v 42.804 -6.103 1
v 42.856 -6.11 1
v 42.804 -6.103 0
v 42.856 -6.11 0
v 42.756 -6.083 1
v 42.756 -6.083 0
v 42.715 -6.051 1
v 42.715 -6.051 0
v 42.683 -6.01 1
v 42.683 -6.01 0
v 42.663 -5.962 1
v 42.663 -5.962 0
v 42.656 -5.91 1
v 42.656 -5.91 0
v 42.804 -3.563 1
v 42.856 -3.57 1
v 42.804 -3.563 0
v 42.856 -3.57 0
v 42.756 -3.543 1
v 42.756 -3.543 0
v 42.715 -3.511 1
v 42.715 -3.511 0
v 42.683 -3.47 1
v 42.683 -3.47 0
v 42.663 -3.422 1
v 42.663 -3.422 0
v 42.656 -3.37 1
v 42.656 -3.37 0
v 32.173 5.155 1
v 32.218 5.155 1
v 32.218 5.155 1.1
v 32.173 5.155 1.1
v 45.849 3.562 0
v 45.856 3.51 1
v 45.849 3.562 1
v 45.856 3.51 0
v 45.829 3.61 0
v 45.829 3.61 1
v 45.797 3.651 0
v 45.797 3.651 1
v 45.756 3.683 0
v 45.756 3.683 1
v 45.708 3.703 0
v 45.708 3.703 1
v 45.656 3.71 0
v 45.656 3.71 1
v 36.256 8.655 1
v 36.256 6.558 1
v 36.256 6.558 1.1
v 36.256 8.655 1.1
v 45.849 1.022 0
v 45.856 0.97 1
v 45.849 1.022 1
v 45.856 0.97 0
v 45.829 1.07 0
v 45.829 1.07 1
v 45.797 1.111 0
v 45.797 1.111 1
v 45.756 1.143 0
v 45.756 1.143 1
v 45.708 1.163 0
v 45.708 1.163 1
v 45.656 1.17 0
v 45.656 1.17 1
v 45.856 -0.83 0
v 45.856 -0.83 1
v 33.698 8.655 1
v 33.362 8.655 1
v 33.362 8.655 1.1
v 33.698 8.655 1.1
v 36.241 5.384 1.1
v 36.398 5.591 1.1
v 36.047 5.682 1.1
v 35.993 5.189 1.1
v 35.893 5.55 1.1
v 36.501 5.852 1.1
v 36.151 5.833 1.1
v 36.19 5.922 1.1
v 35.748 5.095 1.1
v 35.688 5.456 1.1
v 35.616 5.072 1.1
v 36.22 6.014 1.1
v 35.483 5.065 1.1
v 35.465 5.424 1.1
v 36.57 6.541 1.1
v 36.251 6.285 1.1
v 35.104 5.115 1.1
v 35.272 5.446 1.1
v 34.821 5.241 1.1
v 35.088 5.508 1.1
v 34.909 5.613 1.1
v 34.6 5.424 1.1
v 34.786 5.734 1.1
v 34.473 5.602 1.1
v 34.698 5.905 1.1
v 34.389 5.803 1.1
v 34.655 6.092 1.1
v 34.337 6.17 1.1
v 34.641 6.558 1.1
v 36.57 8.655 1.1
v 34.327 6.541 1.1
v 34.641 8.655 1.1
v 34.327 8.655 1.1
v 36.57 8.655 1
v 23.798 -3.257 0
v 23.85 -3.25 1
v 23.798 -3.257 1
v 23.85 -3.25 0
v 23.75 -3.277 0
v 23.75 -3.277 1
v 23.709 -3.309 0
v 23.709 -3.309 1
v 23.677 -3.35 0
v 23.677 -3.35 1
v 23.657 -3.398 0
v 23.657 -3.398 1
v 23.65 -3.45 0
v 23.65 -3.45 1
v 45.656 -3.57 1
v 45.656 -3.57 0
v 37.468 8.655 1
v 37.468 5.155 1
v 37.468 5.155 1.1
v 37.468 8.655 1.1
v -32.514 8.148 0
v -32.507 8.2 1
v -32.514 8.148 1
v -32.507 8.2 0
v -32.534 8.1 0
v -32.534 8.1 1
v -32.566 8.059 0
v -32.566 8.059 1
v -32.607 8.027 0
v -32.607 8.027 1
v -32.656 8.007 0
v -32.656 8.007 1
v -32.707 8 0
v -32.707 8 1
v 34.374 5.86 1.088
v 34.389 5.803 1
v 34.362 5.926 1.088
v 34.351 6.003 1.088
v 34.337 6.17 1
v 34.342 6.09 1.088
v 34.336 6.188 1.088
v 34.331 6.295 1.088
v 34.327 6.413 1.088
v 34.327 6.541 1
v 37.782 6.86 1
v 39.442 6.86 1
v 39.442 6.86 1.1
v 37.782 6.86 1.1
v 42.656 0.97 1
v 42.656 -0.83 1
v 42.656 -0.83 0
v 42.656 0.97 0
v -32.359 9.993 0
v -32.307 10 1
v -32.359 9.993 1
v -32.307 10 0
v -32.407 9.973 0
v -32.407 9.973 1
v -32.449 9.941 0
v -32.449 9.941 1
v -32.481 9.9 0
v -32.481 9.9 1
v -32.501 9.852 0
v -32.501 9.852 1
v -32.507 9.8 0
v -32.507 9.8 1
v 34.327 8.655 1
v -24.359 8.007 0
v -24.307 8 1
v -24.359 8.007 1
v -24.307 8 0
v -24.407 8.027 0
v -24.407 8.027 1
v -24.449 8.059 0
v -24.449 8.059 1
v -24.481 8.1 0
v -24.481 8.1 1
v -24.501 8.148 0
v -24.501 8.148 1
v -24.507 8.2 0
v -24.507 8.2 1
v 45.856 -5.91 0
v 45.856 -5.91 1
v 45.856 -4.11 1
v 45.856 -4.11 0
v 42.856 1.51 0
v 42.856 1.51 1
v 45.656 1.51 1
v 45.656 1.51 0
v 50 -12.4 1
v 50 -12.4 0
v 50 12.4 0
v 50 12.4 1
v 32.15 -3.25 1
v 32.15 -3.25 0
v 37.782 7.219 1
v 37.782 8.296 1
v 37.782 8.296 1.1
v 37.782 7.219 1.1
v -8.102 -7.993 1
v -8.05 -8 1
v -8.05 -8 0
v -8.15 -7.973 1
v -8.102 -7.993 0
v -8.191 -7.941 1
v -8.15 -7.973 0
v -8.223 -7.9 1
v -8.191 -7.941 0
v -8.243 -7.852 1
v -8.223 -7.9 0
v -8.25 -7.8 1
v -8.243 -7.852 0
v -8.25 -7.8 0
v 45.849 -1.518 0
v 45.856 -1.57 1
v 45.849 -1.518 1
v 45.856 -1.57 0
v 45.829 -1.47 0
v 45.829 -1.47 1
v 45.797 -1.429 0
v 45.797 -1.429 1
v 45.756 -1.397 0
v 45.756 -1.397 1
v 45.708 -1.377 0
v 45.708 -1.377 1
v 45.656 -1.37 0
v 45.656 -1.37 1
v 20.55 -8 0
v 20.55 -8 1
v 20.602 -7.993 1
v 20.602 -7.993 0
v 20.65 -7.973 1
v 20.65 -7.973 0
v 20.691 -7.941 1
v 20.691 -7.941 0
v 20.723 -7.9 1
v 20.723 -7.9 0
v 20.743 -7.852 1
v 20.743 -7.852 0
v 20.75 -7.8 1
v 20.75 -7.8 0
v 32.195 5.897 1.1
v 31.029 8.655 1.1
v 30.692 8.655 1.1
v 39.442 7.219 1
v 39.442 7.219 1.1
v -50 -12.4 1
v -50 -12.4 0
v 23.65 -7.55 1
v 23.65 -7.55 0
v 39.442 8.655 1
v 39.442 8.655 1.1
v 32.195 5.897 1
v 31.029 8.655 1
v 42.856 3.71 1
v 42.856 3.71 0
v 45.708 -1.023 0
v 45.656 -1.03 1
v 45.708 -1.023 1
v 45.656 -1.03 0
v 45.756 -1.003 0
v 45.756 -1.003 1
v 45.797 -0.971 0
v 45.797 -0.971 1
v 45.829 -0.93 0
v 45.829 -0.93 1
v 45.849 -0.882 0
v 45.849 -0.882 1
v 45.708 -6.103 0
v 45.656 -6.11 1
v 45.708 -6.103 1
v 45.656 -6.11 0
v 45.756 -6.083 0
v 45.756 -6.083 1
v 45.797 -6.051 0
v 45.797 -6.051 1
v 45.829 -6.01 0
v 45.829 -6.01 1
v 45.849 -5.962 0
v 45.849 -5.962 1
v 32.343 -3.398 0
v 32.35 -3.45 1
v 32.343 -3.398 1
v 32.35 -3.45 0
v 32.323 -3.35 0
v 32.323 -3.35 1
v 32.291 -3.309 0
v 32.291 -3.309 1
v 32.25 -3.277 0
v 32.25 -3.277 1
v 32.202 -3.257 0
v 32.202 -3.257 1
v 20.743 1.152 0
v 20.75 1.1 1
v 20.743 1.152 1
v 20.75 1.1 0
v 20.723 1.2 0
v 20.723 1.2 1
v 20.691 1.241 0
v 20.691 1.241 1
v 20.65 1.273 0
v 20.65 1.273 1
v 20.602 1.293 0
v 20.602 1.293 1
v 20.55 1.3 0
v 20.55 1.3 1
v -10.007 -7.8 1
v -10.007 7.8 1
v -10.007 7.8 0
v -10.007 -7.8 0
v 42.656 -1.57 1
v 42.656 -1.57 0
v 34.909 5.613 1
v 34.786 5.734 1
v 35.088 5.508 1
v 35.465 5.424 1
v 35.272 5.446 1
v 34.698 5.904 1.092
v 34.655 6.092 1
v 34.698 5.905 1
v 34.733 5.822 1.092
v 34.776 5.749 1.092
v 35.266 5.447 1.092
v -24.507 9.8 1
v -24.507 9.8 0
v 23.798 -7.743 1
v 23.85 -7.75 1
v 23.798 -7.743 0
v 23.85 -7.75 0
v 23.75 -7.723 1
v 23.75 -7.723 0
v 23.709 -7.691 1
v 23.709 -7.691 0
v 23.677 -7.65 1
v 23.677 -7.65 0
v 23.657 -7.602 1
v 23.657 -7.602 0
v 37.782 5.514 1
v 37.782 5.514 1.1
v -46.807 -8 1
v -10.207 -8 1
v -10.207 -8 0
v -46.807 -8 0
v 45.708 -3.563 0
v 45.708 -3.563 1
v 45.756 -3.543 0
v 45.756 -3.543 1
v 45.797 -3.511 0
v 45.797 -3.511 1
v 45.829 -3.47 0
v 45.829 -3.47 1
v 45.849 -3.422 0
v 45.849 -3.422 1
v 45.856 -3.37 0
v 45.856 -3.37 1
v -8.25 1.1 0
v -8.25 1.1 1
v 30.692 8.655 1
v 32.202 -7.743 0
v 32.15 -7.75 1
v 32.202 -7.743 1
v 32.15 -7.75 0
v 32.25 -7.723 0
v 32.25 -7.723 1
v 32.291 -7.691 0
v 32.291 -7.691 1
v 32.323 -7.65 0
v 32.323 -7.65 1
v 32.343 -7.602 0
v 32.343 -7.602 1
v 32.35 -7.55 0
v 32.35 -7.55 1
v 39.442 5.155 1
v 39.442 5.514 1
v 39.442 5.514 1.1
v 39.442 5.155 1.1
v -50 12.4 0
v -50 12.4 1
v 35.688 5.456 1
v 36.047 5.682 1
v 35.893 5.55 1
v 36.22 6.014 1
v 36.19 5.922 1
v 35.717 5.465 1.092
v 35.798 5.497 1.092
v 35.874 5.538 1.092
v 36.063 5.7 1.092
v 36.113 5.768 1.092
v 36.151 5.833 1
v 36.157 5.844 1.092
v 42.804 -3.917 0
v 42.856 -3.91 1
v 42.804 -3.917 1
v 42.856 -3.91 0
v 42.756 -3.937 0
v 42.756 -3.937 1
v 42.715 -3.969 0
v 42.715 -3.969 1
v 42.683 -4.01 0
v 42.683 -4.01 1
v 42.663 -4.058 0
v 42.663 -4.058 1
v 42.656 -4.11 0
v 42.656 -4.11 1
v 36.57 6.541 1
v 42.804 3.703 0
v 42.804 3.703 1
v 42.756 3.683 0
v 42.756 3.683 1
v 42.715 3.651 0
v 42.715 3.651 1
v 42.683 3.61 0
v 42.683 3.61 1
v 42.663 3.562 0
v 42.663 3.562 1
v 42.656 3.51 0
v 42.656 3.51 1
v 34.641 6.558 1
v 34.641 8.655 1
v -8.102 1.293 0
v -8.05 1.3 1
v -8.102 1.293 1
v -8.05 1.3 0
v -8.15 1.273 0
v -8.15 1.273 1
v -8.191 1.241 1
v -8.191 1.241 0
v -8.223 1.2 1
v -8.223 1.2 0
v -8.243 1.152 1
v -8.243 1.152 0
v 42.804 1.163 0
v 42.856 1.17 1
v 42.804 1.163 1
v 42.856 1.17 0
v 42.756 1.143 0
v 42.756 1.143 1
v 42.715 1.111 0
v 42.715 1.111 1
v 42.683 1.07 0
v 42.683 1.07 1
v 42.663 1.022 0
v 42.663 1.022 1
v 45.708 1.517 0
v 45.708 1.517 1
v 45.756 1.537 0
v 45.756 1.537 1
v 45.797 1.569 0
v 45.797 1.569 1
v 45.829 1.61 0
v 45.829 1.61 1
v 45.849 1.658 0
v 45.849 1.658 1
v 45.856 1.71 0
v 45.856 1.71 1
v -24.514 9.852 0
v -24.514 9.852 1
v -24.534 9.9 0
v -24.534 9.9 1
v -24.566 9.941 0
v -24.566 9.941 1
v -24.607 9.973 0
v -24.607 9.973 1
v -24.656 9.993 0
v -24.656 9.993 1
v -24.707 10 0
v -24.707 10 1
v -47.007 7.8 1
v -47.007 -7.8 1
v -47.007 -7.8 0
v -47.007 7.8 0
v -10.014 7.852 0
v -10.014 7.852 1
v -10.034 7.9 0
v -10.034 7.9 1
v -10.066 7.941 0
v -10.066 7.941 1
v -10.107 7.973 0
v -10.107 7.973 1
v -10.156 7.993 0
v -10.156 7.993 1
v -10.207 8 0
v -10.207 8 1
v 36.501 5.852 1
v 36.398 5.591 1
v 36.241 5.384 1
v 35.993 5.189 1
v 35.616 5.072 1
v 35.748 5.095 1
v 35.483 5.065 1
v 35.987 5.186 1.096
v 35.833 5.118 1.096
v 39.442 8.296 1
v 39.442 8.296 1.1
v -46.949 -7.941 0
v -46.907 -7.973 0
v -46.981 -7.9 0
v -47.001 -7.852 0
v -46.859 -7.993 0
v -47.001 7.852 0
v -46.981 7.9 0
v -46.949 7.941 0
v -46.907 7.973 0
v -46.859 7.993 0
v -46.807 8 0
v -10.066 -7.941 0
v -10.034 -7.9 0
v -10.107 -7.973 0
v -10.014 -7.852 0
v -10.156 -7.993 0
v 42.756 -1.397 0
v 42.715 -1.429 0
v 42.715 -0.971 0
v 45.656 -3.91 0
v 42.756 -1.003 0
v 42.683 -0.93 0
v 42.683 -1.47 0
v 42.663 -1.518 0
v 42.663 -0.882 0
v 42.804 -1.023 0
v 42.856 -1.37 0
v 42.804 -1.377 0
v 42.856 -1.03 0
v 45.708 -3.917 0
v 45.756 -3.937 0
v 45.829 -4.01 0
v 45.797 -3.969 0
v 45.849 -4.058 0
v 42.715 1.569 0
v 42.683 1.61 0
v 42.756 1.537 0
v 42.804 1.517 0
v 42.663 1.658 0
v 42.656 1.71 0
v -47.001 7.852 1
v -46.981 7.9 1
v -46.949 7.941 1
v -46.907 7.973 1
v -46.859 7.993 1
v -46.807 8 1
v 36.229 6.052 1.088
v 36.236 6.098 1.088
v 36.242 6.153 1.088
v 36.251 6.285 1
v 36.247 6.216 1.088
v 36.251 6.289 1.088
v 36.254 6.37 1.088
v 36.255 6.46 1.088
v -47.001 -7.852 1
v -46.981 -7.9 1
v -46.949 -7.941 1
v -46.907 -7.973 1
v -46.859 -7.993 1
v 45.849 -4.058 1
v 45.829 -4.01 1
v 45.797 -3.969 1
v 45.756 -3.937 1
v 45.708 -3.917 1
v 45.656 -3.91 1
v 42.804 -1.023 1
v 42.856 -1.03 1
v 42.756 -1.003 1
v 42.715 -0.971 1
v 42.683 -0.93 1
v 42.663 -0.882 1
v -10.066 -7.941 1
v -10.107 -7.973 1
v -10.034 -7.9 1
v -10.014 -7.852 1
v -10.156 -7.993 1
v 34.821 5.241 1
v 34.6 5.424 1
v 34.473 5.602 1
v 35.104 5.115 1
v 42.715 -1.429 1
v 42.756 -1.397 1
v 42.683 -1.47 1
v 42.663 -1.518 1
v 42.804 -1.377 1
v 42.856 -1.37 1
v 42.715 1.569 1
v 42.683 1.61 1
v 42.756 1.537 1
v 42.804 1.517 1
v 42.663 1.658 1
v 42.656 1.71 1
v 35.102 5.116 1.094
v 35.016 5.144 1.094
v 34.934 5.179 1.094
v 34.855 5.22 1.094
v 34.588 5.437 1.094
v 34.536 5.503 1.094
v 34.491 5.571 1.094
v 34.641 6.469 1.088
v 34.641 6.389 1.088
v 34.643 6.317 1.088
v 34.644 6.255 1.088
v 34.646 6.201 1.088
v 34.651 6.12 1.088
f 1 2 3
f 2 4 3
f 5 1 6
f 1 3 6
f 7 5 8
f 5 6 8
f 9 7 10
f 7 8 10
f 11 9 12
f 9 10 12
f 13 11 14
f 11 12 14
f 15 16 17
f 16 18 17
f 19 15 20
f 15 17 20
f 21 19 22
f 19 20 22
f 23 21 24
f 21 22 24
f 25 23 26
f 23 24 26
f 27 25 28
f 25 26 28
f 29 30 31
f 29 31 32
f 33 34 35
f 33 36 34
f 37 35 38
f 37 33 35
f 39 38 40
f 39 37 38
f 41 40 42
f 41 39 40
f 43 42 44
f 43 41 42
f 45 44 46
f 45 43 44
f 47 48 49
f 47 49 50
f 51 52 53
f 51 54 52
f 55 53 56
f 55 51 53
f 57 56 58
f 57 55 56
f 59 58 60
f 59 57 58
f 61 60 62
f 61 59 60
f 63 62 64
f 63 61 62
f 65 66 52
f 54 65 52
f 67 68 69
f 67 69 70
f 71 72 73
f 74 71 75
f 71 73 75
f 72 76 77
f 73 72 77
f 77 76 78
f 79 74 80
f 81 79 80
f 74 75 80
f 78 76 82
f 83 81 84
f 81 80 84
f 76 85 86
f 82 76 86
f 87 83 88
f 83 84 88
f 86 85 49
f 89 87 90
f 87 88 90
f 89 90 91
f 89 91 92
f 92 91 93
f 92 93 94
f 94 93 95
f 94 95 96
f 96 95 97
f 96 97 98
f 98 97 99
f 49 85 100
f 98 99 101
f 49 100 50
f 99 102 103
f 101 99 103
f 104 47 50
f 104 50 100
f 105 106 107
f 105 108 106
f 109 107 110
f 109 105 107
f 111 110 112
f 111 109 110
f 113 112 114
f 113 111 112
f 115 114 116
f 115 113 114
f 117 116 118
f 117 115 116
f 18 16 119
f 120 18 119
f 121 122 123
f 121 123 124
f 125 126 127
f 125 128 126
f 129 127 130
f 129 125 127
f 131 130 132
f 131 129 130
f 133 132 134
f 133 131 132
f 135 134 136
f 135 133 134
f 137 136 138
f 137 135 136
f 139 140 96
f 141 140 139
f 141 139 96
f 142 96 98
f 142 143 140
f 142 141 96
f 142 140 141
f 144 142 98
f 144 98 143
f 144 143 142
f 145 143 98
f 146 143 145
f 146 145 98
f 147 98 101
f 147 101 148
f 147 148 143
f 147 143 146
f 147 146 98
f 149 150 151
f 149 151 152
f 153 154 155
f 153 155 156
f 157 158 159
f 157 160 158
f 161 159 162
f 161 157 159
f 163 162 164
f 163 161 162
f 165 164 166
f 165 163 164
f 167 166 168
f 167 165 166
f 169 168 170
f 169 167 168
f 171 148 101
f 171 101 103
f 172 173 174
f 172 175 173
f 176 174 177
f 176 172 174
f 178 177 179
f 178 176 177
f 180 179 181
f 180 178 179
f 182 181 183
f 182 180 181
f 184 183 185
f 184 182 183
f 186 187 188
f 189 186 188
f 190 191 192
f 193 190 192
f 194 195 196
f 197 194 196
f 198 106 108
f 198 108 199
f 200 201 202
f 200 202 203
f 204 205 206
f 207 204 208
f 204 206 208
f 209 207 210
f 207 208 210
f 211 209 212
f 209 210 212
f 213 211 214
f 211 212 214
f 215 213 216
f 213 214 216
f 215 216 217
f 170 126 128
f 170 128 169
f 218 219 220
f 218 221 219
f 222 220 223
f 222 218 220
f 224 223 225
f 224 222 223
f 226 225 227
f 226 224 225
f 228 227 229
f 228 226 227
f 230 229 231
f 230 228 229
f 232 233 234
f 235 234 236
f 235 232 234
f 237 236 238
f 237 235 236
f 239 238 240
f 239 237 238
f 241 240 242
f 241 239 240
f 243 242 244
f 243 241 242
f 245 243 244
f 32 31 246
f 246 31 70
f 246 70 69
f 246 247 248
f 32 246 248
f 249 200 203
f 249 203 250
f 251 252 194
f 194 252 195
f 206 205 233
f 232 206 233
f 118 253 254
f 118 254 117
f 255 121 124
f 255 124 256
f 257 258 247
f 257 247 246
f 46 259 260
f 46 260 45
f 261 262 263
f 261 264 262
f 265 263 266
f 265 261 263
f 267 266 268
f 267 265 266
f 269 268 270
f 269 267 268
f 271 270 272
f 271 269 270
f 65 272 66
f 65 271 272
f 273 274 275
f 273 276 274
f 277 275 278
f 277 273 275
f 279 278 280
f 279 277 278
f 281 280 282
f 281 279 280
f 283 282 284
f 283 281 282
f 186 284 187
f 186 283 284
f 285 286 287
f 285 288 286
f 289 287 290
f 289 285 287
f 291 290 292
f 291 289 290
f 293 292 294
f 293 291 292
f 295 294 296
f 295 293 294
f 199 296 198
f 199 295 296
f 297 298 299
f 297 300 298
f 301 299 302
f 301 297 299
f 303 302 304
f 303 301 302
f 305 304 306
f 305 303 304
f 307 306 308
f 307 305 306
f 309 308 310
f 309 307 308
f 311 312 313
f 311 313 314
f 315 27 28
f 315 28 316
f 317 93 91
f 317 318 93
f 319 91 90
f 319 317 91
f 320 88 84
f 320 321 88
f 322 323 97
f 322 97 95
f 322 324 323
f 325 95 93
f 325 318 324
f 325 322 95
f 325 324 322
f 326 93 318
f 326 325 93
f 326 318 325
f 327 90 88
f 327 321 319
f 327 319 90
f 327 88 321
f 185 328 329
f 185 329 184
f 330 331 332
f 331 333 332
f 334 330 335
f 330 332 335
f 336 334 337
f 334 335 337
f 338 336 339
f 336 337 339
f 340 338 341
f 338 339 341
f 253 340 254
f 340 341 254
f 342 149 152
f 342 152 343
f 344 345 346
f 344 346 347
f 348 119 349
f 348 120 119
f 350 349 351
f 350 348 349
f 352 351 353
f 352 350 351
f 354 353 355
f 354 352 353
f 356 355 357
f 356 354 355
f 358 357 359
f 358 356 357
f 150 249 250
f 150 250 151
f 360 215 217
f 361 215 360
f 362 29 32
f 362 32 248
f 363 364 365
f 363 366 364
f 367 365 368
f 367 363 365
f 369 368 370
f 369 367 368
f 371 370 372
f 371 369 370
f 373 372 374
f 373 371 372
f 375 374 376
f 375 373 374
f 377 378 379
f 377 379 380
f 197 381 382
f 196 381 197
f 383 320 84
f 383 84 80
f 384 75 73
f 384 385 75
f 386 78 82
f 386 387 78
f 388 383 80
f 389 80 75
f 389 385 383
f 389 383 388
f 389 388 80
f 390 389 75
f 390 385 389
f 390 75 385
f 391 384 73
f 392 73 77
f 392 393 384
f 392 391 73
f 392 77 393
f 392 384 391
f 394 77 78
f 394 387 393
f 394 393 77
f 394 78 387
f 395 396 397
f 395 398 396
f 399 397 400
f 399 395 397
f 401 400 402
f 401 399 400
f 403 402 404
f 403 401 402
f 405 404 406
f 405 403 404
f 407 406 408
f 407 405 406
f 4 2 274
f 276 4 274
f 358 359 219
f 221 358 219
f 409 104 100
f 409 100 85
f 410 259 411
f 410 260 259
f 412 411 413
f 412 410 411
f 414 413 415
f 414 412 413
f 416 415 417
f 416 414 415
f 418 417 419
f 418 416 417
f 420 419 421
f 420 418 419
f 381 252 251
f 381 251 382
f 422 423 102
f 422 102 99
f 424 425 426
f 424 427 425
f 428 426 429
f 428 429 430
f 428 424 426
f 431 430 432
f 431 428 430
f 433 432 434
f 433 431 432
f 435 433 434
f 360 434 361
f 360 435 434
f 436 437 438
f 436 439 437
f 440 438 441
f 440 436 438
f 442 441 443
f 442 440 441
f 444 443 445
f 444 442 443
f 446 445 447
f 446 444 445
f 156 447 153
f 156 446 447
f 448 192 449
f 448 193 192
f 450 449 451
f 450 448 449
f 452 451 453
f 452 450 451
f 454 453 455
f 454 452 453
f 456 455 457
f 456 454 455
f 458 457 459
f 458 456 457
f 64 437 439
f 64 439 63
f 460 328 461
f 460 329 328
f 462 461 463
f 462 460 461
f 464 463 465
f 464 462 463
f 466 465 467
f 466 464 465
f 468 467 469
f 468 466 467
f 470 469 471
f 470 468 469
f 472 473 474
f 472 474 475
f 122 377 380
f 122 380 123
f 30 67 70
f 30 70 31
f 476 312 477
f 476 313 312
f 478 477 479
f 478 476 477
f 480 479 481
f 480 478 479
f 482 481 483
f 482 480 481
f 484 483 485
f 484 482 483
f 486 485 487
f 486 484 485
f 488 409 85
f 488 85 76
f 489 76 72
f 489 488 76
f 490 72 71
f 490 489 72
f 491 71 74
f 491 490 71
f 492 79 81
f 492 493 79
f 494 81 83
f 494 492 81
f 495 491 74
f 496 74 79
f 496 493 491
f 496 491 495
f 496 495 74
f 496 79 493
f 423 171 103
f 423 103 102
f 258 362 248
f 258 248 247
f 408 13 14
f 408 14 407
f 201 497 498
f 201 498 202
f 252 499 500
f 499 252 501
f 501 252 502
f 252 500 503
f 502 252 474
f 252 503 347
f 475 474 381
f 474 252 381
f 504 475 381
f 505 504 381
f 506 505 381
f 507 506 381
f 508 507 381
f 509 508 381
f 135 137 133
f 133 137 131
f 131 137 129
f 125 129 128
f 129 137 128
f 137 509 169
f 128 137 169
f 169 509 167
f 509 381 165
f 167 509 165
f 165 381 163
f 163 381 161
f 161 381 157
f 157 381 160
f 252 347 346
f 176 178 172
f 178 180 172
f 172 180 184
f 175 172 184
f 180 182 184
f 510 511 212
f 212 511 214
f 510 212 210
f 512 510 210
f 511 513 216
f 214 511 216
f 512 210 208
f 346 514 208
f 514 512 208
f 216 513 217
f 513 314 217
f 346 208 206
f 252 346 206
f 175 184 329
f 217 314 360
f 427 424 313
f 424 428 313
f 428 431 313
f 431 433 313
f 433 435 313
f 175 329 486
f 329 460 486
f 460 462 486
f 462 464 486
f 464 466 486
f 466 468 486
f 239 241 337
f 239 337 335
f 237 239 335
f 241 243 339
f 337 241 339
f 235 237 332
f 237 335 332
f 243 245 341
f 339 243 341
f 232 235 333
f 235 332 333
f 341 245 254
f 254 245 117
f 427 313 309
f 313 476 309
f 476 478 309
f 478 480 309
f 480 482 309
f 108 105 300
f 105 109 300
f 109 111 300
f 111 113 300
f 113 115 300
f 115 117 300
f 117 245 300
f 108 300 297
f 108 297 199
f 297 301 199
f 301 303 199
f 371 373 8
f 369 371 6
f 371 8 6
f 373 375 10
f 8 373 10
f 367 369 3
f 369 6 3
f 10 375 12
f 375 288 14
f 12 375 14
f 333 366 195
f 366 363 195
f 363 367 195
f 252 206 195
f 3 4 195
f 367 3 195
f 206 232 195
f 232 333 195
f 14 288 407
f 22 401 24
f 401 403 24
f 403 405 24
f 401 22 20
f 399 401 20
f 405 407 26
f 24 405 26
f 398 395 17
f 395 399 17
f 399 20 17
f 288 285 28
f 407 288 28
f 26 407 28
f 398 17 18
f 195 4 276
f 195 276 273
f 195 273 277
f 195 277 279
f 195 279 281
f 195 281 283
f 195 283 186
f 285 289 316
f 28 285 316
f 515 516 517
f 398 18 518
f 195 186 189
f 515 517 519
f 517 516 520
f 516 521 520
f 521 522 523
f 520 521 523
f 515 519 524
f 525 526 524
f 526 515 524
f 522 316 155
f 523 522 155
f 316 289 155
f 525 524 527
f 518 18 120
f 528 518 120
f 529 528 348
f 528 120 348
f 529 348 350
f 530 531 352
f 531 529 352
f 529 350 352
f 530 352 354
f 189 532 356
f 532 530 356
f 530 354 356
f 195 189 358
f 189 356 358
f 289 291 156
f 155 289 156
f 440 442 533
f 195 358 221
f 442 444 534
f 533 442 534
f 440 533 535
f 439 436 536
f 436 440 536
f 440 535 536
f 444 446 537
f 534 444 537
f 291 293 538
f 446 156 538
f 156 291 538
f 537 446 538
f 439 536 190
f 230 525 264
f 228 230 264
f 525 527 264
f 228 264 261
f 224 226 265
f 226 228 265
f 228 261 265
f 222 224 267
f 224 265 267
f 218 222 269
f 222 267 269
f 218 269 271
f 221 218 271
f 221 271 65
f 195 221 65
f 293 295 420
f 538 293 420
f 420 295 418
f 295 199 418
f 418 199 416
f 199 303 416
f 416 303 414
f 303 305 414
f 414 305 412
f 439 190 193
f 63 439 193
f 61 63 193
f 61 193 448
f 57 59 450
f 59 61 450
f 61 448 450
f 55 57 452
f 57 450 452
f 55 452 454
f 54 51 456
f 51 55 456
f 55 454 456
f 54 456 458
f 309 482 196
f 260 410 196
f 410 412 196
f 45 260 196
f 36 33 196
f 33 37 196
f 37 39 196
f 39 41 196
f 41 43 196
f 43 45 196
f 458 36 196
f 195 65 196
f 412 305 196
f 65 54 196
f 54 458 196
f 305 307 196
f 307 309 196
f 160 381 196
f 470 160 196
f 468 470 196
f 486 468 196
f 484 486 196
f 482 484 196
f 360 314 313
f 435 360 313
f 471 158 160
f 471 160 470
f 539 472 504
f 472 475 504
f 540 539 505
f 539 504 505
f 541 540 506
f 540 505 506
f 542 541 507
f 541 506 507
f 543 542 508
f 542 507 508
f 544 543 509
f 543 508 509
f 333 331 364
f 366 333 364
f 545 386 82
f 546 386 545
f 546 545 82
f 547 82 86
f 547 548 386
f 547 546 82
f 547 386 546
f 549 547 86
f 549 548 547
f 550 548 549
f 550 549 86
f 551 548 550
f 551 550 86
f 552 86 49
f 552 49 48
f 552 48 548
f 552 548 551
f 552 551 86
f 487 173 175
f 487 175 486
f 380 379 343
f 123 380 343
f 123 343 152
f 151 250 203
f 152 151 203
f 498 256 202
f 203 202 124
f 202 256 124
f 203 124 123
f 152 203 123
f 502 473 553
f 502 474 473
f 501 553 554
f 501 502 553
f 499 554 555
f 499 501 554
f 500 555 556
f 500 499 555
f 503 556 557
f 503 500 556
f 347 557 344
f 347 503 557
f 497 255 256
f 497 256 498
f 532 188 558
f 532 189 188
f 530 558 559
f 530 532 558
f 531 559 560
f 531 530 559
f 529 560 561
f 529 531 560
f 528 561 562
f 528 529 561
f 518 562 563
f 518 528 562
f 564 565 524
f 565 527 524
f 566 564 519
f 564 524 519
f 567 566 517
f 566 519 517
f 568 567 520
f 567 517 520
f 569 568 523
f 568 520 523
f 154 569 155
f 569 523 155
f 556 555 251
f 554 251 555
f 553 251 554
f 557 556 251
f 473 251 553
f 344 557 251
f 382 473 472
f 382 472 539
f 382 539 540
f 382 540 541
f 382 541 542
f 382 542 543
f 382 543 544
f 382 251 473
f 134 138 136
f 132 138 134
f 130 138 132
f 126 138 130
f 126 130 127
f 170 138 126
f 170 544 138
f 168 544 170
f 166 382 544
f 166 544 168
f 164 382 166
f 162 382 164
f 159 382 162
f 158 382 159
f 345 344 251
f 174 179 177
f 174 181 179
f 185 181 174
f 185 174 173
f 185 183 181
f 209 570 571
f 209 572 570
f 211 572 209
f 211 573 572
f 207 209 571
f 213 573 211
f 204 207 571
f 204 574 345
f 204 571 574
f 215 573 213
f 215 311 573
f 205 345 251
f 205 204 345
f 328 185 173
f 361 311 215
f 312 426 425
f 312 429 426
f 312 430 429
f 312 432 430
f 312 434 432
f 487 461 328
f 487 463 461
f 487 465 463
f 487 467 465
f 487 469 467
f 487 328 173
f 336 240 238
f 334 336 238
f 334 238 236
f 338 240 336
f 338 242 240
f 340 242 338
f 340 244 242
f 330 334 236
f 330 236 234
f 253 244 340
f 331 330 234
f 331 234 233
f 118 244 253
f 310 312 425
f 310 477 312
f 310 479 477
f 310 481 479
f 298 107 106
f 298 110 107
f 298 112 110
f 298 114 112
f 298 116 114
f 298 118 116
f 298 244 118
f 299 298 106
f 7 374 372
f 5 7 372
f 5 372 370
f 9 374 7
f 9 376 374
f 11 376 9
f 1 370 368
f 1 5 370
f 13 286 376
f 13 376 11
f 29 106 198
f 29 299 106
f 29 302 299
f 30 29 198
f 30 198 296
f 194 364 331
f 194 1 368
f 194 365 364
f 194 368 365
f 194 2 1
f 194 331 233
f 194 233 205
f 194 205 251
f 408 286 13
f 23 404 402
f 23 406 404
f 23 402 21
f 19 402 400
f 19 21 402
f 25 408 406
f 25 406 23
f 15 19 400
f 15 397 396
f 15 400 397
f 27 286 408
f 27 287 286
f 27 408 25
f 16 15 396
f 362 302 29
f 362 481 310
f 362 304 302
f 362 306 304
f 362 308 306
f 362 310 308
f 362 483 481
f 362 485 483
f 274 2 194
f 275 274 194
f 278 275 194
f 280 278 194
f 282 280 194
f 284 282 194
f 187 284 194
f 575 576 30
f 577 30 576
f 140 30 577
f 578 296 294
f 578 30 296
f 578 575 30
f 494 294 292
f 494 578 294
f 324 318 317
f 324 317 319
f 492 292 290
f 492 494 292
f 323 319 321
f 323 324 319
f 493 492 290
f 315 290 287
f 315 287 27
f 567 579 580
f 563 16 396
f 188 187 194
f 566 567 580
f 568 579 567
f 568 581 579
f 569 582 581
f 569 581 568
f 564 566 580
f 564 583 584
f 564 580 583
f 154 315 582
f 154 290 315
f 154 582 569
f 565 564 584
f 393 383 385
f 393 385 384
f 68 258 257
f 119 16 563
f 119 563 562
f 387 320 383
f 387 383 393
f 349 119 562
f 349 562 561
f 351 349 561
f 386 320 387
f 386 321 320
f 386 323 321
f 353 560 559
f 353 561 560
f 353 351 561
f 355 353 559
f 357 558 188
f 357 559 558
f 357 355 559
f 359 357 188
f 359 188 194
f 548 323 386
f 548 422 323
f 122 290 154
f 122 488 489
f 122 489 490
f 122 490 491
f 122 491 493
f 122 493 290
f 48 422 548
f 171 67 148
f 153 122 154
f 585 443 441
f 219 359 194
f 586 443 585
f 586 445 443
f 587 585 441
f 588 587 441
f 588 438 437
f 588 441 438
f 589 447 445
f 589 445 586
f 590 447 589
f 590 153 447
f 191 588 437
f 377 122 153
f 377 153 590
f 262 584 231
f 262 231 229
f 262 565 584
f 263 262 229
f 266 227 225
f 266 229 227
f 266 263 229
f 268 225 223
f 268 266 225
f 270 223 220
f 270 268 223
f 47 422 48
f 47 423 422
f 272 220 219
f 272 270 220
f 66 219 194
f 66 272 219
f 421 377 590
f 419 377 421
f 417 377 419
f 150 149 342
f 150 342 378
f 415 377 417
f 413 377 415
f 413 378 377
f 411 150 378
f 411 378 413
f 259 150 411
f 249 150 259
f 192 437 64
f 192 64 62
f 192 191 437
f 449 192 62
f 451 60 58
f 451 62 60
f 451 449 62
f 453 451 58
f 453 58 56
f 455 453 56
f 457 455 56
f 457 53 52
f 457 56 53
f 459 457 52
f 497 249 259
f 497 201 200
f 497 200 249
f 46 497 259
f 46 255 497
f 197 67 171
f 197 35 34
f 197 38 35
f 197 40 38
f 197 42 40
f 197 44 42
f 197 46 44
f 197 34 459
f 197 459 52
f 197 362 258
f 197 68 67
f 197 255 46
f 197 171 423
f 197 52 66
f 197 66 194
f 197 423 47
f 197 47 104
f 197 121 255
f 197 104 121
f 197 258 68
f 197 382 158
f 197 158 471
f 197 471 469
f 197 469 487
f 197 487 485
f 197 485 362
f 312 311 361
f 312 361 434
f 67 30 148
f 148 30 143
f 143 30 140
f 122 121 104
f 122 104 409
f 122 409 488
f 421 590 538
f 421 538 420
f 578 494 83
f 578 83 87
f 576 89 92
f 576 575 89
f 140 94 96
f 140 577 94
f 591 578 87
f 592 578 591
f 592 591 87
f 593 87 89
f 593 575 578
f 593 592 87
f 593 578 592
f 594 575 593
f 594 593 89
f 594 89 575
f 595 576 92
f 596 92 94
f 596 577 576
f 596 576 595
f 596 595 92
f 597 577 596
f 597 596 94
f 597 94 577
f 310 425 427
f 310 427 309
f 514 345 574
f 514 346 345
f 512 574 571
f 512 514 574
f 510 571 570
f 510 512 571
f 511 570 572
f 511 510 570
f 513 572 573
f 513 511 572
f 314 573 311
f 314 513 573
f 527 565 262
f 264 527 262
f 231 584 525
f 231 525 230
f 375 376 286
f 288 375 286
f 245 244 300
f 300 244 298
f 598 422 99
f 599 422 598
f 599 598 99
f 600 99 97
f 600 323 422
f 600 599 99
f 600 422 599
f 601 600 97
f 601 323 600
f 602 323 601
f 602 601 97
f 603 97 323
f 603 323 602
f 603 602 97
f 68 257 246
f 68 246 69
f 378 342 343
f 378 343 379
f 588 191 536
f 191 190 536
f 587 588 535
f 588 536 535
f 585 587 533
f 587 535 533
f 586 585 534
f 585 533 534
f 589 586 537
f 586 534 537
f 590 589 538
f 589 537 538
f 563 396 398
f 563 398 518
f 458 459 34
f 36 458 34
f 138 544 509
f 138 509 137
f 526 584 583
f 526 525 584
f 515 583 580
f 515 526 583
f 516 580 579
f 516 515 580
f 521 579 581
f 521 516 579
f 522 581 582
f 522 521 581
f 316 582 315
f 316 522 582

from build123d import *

# Parameters (mm, degrees)
ESQUISSE1_W             = 100
ESQUISSE1_H             = 24.8
BOSS_EXTRU_1_DEPTH      = 1
ESQUISSE2_W             = 29
ESQUISSE2_H             = 9.3
ESQUISSE2_W_2           = 8.7
ESQUISSE2_H_2           = 4.5
ESQUISSE2_W_3           = 3.2
ESQUISSE2_H_3           = 2.2
ENL_V_MAT_EXTRU_1_DEPTH = 52.524363169
CONG_1_R                = 0.2
BOSS_EXTRU_2_DEPTH      = 0.1


with BuildPart() as part:
    # Esquisse1 → Boss.-Extru.1 (new body)
    with BuildSketch(Plane.XY):
        Rectangle(ESQUISSE1_W, ESQUISSE1_H)
    extrude(amount=BOSS_EXTRU_1_DEPTH)

    # Esquisse2 → Enlèv. mat.-Extru.1 (cut, through all)
    with BuildSketch(Plane.XY.offset(1)):
        Polygon((-47.0074, 8), (-32.5074, 8), (-32.5074, 10), (-24.5074, 10), (-24.5074, 8), (-10.0074, 8), (-10.0074, -8), (-47.0074, -8), align=None)
        with Locations((6.25, -3.35)):
            Rectangle(ESQUISSE2_W, ESQUISSE2_H)
        with Locations((28, -5.5)):
            Rectangle(ESQUISSE2_W_2, ESQUISSE2_H_2)
        with Locations((44.255985376, 2.61)):
            Rectangle(ESQUISSE2_W_3, ESQUISSE2_H_3)
        with Locations((44.255985376, 0.07)):
            Rectangle(ESQUISSE2_W_3, ESQUISSE2_H_3)
        with Locations((44.255985376, -2.47)):
            Rectangle(ESQUISSE2_W_3, ESQUISSE2_H_3)
        with Locations((44.255985376, -5.01)):
            Rectangle(ESQUISSE2_W_3, ESQUISSE2_H_3)
    extrude(amount=-ENL_V_MAT_EXTRU_1_DEPTH, mode=Mode.SUBTRACT)

    # Congé1
    cong_1_edges = [part.edges().sort_by_distance(p)[0] for p in [
        (45.855985376, -3.91, 0.5),
        (45.855985376, -6.11, 0.5),
        (42.655985376, -6.11, 0.5),
        (42.655985376, -3.91, 0.5),
        (-47.0074, -8, 0.5),
        (-47.0074, 8, 0.5),
        (-32.5074, 8, 0.5),
        (-32.5074, 10, 0.5),
        (-24.5074, 10, 0.5),
        (-24.5074, 8, 0.5),
        (-10.0074, 8, 0.5),
        (-10.0074, -8, 0.5),
        (-8.25, -8, 0.5),
        (-8.25, 1.3, 0.5),
        (20.75, 1.3, 0.5),
        (20.75, -8, 0.5),
        (23.65, -7.75, 0.5),
        (23.65, -3.25, 0.5),
        (32.35, -3.25, 0.5),
        (32.35, -7.75, 0.5),
        (45.855985376, 3.71, 0.5),
        (45.855985376, 1.51, 0.5),
        (42.655985376, 1.51, 0.5),
        (42.655985376, 3.71, 0.5),
        (45.855985376, 1.17, 0.5),
        (45.855985376, -1.03, 0.5),
        (42.655985376, -1.03, 0.5),
        (42.655985376, 1.17, 0.5),
        (45.855985376, -1.37, 0.5),
        (45.855985376, -3.57, 0.5),
        (42.655985376, -3.57, 0.5),
        (42.655985376, -1.37, 0.5),
    ]]
    fillet(cong_1_edges, radius=CONG_1_R)

    # Esquisse3 → Boss.-Extru.2 (add)
    with BuildSketch(Plane.XY.offset(1)):
        Polygon((30.691975839, 8.654898364), (31.028514301, 8.654898364), (32.195180967, 5.896685223), (33.361847634, 8.654898364), (33.698386096, 8.654898364), (32.217616865, 5.154898364), (32.17274507, 5.154898364), align=None)
        with BuildLine():
            Line((34.326591224, 8.654898364), (34.640693788, 8.654898364))
            Line((34.640693788, 8.654898364), (34.640693788, 6.557843075))
            add(Edge.make_bspline(
                [(34.640693788, 6.557843075), (34.640647044, 6.528162339), (34.640558339, 6.471838028), (34.641150853, 6.391669728), (34.642810222, 6.320397269), (34.643856381, 6.257745921), (34.646183715, 6.204003174), (34.648081761, 6.158877863), (34.650522318, 6.122583661), (34.653455436, 6.101402735), (34.654716224, 6.092298203)],
                knots=[0, 0, 0, 0, 1.528628734, 2.90083645, 4.128790002, 5.200304208, 6.127813768, 6.898992206, 7.526736466, 8, 8, 8, 8], degree=3))
            add(Edge.make_bspline(
                [(34.654716224, 6.092298203), (34.659893683, 6.05945144), (34.669956869, 5.995608711), (34.695603247, 5.904700429), (34.731420748, 5.822768971), (34.77386379, 5.74725768), (34.829796402, 5.68026832), (34.896799937, 5.618556667), (34.977977706, 5.564584862), (35.068238311, 5.51523405), (35.165523549, 5.475568968), (35.264934815, 5.445575604), (35.364977794, 5.427296704), (35.431953959, 5.425180165), (35.465213019, 5.424129133)],
                knots=[0, 0, 0, 0, 1.035780045, 2.013197591, 2.933192213, 3.817615948, 4.702609284, 5.640816605, 6.646850145, 7.73207398, 8.84249596, 9.914020372, 10.964143139, 12, 12, 12, 12], degree=3))
            add(Edge.make_bspline(
                [(35.465213019, 5.424129133), (35.493766759, 5.425202983), (35.550709321, 5.427344481), (35.635315752, 5.440605912), (35.71771586, 5.464506478), (35.79831654, 5.495346237), (35.873867525, 5.536093828), (35.944410967, 5.583164667), (36.007374901, 5.638375543), (36.064832899, 5.699475888), (36.114867835, 5.768415688), (36.158238976, 5.843693826), (36.193764906, 5.926443173), (36.211308431, 5.984597595), (36.220321192, 6.014473684)],
                knots=[0, 0, 0, 0, 0.994687771, 1.983630487, 2.973142513, 3.978332533, 4.983357753, 5.956394766, 6.925816176, 7.893390482, 8.871859704, 9.88551698, 10.913711441, 12, 12, 12, 12], degree=3))
            add(Edge.make_bspline(
                [(36.220321192, 6.014473684), (36.223321317, 6.026822258), (36.230006805, 6.054339859), (36.23625385, 6.100861149), (36.242760376, 6.155750513), (36.247274946, 6.219402326), (36.251676166, 6.291603299), (36.254309239, 6.372729556), (36.255526272, 6.462486517), (36.255888952, 6.525123679), (36.256078403, 6.557843075)],
                knots=[0, 0, 0, 0, 0.558680831, 1.244966039, 2.062412453, 2.990489873, 4.051219941, 5.244515665, 6.560634259, 8, 8, 8, 8], degree=3))
            Line((36.256078403, 6.557843075), (36.256078403, 8.654898364))
            Line((36.256078403, 8.654898364), (36.570180967, 8.654898364))
            Line((36.570180967, 8.654898364), (36.570180967, 6.541016152))
            add(Edge.make_bspline(
                [(36.570180967, 6.541016152), (36.569926847, 6.502917773), (36.569430916, 6.42856647), (36.565130339, 6.319615111), (36.558273339, 6.21626213), (36.548585251, 6.118493633), (36.535748248, 6.026659474), (36.521473028, 5.939954706), (36.503293495, 5.859001713), (36.482060093, 5.783169296), (36.457786545, 5.710983782), (36.426345397, 5.642475168), (36.390920897, 5.575560768), (36.348906244, 5.511252659), (36.301694862, 5.449266106), (36.248243181, 5.389977031), (36.19031902, 5.332437985), (36.12695946, 5.278124919), (36.059208935, 5.228316242), (35.987268977, 5.184518471), (35.911692208, 5.147494853), (35.832675082, 5.117018929), (35.750183879, 5.094104329), (35.664216519, 5.077029174), (35.574577326, 5.067326876), (35.513612669, 5.065884946), (35.482741064, 5.065154774)],
                knots=[0, 0, 0, 0, 1.316592851, 2.569410997, 3.76748051, 4.895814652, 5.963796859, 6.97159953, 7.931736103, 8.829262218, 9.692595152, 10.560224239, 11.431080259, 12.30701507, 13.211635791, 14.121146779, 15.063487852, 16.031507147, 17.00238618, 17.966455255, 18.938106653, 19.907068911, 20.888905087, 21.893141452, 22.933117798, 24, 24, 24, 24], degree=3))
            add(Edge.make_bspline(
                [(35.482741064, 5.065154774), (35.449071961, 5.065939539), (35.383013302, 5.067479246), (35.285675235, 5.076301996), (35.192361039, 5.09292039), (35.102085161, 5.114080334), (35.016076664, 5.143264071), (34.93318322, 5.177362196), (34.854824539, 5.219239456), (34.77972941, 5.265832849), (34.709904654, 5.318257488), (34.645807251, 5.375397662), (34.58733138, 5.436338039), (34.535462684, 5.501738405), (34.489341799, 5.571090112), (34.449611586, 5.644589352), (34.415498342, 5.722207668), (34.397891775, 5.776160868), (34.388991064, 5.803436024)],
                knots=[0, 0, 0, 0, 1.13879206, 2.234305948, 3.301075583, 4.341971843, 5.366689343, 6.369221514, 7.369726634, 8.367512178, 9.355451585, 10.318319045, 11.268648973, 12.207971039, 13.137398894, 14.081662264, 15.030215811, 16, 16, 16, 16], degree=3))
            add(Edge.make_bspline(
                [(34.388991064, 5.803436024), (34.383813905, 5.822068598), (34.372584534, 5.862483067), (34.360559236, 5.929369556), (34.350450155, 6.006384473), (34.340944597, 6.093533092), (34.335335639, 6.190882958), (34.3304182, 6.298391874), (34.326556581, 6.416189836), (34.326579353, 6.498244352), (34.326591224, 6.541016152)],
                knots=[0, 0, 0, 0, 0.625038921, 1.35572334, 2.194682327, 3.136881307, 4.189498639, 5.346923369, 6.617055217, 8, 8, 8, 8], degree=3))
            Line((34.326591224, 6.541016152), (34.326591224, 8.654898364))
        make_face()
        Polygon((37.467616865, 8.654898364), (39.441975839, 8.654898364), (39.441975839, 8.295924005), (37.781719429, 8.295924005), (37.781719429, 7.219000928), (39.441975839, 7.219000928), (39.441975839, 6.860026569), (37.781719429, 6.860026569), (37.781719429, 5.513872723), (39.441975839, 5.513872723), (39.441975839, 5.154898364), (37.467616865, 5.154898364), align=None)
    extrude(amount=BOSS_EXTRU_2_DEPTH)


solid = part.part
